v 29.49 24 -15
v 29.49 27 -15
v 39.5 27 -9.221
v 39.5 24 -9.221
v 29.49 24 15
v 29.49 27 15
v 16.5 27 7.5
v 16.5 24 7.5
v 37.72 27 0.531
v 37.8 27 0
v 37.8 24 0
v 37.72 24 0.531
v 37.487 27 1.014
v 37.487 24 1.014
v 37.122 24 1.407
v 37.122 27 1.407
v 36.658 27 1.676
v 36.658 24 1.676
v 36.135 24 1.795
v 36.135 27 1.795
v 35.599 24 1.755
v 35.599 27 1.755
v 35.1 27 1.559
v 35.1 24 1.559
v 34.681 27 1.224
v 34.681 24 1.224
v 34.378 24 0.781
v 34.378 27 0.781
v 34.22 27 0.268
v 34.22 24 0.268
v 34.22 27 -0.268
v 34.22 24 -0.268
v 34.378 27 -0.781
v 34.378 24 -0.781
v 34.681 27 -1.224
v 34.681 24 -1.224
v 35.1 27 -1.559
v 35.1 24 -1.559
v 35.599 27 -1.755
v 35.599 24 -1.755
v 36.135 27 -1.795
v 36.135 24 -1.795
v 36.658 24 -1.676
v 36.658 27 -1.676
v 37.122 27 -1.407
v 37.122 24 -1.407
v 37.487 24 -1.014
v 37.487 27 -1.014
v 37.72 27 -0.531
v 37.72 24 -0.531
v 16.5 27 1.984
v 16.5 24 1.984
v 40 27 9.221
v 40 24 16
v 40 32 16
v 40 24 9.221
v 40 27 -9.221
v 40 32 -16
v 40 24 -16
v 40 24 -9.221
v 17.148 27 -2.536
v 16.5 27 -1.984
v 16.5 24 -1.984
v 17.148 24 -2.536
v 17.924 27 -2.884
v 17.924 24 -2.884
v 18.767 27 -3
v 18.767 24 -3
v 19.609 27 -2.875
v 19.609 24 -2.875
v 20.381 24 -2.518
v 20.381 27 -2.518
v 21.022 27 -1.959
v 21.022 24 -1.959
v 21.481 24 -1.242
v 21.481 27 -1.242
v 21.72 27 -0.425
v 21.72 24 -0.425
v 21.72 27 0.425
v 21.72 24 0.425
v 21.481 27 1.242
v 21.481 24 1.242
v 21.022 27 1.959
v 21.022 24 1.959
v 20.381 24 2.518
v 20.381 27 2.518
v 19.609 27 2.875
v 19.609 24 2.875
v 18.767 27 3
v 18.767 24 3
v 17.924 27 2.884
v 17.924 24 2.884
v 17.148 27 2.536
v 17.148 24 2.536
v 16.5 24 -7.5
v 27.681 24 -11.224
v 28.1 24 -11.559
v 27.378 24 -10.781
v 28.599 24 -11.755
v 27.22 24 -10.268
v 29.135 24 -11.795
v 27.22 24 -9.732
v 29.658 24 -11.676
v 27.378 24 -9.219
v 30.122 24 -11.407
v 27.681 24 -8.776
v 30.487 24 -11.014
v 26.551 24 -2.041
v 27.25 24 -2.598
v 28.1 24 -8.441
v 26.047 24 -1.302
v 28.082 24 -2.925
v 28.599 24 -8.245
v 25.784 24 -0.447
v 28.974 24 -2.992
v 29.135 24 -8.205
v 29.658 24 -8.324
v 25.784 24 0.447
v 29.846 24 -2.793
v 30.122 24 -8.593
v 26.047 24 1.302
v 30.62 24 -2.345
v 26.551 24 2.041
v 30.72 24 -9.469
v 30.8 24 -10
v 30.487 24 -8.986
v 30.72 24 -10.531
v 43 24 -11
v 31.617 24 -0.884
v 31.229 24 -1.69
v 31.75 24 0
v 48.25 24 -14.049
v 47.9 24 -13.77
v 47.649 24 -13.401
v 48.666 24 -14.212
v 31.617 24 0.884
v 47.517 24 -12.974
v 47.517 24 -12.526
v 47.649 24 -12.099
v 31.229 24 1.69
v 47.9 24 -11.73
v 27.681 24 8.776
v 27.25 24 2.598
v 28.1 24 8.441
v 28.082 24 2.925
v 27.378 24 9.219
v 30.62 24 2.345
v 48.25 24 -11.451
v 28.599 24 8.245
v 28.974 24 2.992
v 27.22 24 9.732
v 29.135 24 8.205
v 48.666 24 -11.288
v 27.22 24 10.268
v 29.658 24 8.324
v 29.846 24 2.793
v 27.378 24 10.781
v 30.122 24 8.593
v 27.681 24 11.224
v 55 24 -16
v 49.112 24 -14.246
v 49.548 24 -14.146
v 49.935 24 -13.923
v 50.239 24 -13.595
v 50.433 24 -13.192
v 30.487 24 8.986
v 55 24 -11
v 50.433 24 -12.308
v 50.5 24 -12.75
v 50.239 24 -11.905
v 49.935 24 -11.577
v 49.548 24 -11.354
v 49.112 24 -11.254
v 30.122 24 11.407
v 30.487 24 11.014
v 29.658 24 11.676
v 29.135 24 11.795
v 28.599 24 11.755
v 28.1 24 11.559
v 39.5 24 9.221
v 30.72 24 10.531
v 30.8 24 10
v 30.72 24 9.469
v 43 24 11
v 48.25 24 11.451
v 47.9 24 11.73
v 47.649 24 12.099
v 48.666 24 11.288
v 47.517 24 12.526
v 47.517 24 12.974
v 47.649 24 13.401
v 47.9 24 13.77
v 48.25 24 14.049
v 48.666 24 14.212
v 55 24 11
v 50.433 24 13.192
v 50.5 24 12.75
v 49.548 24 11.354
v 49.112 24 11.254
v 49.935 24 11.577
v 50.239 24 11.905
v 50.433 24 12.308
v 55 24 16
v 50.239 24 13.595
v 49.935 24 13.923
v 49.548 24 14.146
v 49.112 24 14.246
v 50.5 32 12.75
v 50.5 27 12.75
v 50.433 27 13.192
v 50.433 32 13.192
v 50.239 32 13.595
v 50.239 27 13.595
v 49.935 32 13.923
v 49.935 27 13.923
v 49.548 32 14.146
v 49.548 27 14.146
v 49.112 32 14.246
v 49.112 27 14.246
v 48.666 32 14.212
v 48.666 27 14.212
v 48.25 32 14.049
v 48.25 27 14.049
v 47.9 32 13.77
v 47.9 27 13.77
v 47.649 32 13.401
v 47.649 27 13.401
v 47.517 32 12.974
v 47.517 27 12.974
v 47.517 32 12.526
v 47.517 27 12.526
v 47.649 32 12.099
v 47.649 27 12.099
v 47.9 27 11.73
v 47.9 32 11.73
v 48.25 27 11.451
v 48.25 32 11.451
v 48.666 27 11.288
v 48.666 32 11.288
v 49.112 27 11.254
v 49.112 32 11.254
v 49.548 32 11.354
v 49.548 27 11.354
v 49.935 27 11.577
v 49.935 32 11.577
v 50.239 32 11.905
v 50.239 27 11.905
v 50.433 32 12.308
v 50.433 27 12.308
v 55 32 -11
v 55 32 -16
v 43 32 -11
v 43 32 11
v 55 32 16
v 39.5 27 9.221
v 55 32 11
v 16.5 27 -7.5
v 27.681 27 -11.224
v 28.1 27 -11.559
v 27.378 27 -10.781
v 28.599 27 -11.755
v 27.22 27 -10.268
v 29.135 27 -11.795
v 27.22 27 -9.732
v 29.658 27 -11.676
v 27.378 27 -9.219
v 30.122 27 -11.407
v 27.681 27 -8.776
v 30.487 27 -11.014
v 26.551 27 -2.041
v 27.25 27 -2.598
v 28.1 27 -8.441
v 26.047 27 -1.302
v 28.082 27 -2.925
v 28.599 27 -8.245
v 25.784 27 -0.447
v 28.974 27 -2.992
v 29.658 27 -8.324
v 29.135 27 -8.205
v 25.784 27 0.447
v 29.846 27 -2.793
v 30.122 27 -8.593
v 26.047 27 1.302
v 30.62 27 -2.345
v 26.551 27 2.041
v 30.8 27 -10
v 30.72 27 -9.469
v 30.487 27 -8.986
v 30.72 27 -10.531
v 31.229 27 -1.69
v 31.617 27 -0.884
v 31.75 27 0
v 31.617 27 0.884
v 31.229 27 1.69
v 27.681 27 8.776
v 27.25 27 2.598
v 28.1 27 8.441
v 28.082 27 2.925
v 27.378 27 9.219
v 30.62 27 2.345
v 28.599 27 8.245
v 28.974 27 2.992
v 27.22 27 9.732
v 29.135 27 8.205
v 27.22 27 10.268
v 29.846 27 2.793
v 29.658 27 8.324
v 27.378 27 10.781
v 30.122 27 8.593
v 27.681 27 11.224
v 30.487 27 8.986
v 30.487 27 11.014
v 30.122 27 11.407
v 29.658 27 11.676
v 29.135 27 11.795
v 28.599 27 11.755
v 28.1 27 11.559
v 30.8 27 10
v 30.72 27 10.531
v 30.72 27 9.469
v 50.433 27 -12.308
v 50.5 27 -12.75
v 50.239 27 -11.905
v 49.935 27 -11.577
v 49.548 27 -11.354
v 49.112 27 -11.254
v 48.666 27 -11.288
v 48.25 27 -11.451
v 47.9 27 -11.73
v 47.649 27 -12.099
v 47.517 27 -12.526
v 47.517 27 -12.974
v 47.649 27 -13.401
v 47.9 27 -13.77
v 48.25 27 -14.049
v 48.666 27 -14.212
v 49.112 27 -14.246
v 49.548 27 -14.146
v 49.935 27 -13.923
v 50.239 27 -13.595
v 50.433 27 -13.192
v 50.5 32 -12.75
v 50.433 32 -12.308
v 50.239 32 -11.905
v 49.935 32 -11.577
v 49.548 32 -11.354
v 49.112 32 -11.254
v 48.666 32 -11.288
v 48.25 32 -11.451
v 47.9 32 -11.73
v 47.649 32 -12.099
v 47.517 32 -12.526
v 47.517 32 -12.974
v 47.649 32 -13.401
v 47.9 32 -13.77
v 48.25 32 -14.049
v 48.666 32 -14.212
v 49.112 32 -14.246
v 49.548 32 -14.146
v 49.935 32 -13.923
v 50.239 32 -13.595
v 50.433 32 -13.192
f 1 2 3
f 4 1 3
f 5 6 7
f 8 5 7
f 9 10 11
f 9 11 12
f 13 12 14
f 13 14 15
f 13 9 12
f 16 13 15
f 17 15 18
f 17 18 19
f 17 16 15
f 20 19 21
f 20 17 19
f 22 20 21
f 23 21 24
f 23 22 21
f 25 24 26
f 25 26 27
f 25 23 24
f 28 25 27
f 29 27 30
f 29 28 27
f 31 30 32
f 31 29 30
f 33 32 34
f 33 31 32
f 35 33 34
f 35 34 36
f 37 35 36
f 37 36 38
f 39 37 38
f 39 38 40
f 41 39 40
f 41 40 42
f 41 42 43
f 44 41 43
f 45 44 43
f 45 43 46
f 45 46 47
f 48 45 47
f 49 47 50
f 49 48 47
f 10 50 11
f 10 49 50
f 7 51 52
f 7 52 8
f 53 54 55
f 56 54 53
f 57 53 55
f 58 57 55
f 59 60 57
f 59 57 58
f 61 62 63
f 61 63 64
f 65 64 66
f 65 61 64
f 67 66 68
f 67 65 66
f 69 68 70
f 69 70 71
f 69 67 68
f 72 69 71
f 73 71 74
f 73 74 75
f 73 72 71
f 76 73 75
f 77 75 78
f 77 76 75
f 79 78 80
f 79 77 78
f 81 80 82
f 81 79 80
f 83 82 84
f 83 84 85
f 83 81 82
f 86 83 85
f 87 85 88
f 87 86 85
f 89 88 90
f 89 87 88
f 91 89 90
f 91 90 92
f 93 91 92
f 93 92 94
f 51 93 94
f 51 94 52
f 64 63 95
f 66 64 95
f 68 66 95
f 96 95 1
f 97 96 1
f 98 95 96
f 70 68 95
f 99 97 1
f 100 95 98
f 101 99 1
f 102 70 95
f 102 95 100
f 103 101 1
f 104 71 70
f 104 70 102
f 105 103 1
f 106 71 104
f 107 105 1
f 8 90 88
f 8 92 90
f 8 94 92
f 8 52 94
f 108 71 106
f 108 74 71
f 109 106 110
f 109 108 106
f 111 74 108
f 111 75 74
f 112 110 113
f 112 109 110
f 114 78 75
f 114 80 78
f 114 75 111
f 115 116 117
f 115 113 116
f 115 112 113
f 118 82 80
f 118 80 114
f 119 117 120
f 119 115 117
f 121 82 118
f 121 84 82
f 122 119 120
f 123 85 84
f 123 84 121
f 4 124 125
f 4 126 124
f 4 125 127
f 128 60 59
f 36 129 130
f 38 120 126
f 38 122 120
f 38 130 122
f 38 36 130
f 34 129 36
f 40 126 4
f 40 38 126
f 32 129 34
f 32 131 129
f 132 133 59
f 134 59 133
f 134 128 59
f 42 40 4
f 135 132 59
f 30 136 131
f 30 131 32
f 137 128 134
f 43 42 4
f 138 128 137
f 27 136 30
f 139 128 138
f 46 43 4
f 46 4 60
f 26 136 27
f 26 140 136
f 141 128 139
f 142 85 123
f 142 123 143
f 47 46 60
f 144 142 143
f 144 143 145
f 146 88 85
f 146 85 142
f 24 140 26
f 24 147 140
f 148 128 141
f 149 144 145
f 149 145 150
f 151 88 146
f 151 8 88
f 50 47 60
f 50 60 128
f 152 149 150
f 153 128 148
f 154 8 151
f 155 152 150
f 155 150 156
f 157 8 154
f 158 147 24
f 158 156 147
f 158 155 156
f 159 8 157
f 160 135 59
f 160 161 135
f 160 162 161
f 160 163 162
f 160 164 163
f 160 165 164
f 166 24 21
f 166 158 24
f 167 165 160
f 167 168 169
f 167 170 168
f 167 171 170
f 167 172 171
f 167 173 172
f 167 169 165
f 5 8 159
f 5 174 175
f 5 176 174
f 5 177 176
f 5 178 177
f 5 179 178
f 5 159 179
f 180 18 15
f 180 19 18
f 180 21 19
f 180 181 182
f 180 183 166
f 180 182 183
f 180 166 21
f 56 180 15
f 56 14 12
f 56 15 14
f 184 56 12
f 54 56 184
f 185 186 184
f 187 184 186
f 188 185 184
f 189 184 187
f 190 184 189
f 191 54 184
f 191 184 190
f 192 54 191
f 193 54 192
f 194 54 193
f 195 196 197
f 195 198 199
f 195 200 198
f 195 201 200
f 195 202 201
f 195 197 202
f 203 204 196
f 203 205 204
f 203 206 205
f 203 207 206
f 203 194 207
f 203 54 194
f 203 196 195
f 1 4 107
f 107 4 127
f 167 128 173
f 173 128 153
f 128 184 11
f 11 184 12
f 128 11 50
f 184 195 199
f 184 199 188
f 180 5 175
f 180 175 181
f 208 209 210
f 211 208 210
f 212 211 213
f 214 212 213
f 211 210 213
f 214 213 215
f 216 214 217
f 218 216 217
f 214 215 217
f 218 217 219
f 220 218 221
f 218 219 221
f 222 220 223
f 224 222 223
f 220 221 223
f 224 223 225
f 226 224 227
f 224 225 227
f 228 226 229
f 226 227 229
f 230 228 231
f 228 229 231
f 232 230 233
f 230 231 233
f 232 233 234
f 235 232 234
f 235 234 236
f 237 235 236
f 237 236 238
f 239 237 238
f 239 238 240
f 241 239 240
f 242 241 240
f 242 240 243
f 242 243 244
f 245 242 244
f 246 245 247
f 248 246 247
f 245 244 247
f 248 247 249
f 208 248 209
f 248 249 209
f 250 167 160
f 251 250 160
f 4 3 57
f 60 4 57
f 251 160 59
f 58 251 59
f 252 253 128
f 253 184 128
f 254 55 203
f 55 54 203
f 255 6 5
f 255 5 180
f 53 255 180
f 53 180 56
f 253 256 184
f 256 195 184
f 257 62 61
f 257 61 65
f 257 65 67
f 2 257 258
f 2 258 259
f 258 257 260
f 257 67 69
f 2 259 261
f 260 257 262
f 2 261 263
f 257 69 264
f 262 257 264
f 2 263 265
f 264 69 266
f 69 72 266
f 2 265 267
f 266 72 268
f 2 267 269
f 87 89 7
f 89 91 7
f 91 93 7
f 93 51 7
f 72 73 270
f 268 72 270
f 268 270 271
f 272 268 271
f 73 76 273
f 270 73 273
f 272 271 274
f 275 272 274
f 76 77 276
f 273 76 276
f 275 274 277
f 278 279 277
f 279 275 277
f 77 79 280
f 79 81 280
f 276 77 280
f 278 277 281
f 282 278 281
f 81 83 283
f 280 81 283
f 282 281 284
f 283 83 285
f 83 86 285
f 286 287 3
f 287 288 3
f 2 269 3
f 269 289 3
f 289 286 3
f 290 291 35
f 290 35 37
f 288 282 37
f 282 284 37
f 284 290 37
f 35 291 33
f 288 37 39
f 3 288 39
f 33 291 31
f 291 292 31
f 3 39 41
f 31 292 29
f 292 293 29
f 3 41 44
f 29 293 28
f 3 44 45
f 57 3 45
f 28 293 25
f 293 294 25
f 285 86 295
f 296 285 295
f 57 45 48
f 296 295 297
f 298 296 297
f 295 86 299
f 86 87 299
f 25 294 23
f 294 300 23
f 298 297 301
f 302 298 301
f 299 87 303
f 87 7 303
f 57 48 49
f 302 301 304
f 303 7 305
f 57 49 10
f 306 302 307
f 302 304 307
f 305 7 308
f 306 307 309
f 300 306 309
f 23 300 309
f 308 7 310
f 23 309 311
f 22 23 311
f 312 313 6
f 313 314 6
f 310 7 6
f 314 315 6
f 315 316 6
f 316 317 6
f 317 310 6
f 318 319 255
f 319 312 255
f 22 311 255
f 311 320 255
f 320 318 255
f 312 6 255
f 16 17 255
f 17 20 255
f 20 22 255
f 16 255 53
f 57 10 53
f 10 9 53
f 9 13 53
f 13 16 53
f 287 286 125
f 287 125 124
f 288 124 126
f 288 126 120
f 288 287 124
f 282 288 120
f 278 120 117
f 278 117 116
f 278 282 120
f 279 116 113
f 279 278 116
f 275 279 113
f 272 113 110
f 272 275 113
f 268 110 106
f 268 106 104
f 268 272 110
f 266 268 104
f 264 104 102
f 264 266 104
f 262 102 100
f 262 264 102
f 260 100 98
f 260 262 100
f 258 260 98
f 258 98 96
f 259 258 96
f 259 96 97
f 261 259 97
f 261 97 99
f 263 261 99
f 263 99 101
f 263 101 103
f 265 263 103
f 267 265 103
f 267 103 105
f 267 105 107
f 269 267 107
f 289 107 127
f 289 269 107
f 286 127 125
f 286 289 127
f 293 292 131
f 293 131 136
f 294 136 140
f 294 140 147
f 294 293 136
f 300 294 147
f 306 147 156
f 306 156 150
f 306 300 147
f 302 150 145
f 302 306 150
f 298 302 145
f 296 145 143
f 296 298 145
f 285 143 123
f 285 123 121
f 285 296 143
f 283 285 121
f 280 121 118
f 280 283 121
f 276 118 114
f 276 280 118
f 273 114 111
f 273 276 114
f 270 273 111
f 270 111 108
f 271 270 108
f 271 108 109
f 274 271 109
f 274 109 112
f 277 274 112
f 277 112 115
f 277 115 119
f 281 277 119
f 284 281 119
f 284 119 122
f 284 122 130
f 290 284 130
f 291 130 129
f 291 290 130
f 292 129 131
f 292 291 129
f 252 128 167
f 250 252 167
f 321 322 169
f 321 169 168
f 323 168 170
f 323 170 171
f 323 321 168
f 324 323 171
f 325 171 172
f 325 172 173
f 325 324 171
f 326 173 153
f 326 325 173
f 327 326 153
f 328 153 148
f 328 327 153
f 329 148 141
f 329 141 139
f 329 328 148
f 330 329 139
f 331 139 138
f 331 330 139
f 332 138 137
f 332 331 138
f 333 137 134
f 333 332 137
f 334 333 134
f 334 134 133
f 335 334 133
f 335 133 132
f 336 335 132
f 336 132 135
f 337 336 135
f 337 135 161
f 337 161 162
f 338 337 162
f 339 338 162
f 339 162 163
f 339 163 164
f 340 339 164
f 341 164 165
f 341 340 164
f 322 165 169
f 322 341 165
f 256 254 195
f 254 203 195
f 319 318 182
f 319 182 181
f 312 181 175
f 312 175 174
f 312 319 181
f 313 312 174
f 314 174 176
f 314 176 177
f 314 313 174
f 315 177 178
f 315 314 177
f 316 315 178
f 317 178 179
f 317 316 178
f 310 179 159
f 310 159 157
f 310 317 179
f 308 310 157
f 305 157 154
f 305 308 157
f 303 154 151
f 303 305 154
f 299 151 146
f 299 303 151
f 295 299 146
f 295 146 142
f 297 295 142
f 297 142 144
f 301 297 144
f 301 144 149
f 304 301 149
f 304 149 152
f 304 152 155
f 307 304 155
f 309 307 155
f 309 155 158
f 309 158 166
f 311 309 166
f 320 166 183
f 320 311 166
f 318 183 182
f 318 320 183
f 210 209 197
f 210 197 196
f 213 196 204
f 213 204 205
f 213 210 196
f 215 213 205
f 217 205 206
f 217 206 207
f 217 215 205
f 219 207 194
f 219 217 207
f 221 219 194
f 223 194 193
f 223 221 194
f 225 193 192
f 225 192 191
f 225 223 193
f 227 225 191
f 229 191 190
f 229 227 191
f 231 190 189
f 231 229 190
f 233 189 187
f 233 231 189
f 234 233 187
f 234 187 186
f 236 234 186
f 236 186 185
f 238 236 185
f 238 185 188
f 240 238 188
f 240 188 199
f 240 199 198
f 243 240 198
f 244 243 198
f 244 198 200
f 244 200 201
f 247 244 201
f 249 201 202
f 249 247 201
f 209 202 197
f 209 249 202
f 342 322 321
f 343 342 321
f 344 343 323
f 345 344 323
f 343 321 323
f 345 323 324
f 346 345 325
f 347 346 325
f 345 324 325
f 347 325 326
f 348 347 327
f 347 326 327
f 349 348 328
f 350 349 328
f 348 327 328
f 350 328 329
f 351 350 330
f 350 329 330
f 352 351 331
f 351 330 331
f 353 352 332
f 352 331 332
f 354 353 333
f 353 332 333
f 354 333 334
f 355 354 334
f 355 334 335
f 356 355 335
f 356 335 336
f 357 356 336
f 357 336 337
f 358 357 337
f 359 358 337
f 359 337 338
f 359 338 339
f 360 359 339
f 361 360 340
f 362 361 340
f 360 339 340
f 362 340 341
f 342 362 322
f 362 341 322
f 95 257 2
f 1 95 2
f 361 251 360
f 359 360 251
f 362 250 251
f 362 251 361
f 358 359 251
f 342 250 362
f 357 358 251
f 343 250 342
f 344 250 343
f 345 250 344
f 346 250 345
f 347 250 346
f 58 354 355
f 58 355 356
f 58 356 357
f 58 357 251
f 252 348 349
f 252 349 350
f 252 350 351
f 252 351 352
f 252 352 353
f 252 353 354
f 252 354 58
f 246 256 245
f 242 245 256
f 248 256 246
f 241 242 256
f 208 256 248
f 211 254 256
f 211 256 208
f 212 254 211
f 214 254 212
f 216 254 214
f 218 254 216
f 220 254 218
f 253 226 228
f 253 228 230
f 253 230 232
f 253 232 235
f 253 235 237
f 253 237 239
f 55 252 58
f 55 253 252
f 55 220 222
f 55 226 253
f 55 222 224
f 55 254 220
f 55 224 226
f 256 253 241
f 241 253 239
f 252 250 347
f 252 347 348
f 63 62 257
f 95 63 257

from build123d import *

# Parameters (mm, degrees)
SKETCH180_R     = 1.5
PAD127016_DEPTH = 5
SKETCH178_R     = 1.8
SKETCH178_R_2   = 1.5
SKETCH178_R_3   = 3
PAD127015_DEPTH = 3


with BuildPart() as pad127016:
    # Sketch180 → Pad127016 (new body)
    with BuildSketch(Plane.XZ.offset(-27)):
        Polygon((40, -9.220944), (40, 9.220944), (40, 16), (55, 16), (55, 11), (43, 11), (43, -11), (55, -11), (55, -16), (40, -16), align=None)
        with Locations((49, 12.75)):
            Circle(SKETCH180_R, mode=Mode.SUBTRACT)
        with Locations((49, -12.75)):
            Circle(SKETCH180_R, mode=Mode.SUBTRACT)
    extrude(amount=-PAD127016_DEPTH)


with BuildPart() as brakemount:
    # Sketch178 → Pad127015 (new body)
    with BuildSketch(Plane.XZ.offset(-27)):
        with BuildLine():
            Line((29.490381, 15), (16.5, 7.5))
            Line((16.5, 1.984313), (16.5, 7.5))
            ThreePointArc((16.5, -1.984313), (21.75, 0), (16.5, 1.984313))
            Line((16.5, -1.984313), (16.5, -7.5))
            Line((16.5, -7.5), (29.490381, -15))
            Line((29.490381, -15), (39.5, -9.220944))
            Line((39.5, -9.220944), (40, -9.220944))
            Line((40, -16), (40, -9.220944))
            Line((55, -16), (40, -16))
            Line((55, -11), (55, -16))
            Line((55, -11), (43, -11))
            Line((43, -11), (43, 11))
            Line((43, 11), (55, 11))
            Line((55, 11), (55, 16))
            Line((55, 16), (40, 16))
            Line((40, 16), (40, 9.220944))
            Line((39.5, 9.220944), (40, 9.220944))
            Line((29.490381, 15), (39.5, 9.220944))
        make_face()
        with Locations((29, 10)):
            Circle(SKETCH178_R, mode=Mode.SUBTRACT)
        with Locations((36, 0)):
            Circle(SKETCH178_R, mode=Mode.SUBTRACT)
        with Locations((29, -10)):
            Circle(SKETCH178_R, mode=Mode.SUBTRACT)
        with Locations((49, 12.75)):
            Circle(SKETCH178_R_2, mode=Mode.SUBTRACT)
        with Locations((49, -12.75)):
            Circle(SKETCH178_R_2, mode=Mode.SUBTRACT)
        with Locations((28.75, 0)):
            Circle(SKETCH178_R_3, mode=Mode.SUBTRACT)
    extrude(amount=PAD127015_DEPTH)

    # Fusion004020019: union Pad127016
    add(pad127016.part)


solid = brakemount.part
